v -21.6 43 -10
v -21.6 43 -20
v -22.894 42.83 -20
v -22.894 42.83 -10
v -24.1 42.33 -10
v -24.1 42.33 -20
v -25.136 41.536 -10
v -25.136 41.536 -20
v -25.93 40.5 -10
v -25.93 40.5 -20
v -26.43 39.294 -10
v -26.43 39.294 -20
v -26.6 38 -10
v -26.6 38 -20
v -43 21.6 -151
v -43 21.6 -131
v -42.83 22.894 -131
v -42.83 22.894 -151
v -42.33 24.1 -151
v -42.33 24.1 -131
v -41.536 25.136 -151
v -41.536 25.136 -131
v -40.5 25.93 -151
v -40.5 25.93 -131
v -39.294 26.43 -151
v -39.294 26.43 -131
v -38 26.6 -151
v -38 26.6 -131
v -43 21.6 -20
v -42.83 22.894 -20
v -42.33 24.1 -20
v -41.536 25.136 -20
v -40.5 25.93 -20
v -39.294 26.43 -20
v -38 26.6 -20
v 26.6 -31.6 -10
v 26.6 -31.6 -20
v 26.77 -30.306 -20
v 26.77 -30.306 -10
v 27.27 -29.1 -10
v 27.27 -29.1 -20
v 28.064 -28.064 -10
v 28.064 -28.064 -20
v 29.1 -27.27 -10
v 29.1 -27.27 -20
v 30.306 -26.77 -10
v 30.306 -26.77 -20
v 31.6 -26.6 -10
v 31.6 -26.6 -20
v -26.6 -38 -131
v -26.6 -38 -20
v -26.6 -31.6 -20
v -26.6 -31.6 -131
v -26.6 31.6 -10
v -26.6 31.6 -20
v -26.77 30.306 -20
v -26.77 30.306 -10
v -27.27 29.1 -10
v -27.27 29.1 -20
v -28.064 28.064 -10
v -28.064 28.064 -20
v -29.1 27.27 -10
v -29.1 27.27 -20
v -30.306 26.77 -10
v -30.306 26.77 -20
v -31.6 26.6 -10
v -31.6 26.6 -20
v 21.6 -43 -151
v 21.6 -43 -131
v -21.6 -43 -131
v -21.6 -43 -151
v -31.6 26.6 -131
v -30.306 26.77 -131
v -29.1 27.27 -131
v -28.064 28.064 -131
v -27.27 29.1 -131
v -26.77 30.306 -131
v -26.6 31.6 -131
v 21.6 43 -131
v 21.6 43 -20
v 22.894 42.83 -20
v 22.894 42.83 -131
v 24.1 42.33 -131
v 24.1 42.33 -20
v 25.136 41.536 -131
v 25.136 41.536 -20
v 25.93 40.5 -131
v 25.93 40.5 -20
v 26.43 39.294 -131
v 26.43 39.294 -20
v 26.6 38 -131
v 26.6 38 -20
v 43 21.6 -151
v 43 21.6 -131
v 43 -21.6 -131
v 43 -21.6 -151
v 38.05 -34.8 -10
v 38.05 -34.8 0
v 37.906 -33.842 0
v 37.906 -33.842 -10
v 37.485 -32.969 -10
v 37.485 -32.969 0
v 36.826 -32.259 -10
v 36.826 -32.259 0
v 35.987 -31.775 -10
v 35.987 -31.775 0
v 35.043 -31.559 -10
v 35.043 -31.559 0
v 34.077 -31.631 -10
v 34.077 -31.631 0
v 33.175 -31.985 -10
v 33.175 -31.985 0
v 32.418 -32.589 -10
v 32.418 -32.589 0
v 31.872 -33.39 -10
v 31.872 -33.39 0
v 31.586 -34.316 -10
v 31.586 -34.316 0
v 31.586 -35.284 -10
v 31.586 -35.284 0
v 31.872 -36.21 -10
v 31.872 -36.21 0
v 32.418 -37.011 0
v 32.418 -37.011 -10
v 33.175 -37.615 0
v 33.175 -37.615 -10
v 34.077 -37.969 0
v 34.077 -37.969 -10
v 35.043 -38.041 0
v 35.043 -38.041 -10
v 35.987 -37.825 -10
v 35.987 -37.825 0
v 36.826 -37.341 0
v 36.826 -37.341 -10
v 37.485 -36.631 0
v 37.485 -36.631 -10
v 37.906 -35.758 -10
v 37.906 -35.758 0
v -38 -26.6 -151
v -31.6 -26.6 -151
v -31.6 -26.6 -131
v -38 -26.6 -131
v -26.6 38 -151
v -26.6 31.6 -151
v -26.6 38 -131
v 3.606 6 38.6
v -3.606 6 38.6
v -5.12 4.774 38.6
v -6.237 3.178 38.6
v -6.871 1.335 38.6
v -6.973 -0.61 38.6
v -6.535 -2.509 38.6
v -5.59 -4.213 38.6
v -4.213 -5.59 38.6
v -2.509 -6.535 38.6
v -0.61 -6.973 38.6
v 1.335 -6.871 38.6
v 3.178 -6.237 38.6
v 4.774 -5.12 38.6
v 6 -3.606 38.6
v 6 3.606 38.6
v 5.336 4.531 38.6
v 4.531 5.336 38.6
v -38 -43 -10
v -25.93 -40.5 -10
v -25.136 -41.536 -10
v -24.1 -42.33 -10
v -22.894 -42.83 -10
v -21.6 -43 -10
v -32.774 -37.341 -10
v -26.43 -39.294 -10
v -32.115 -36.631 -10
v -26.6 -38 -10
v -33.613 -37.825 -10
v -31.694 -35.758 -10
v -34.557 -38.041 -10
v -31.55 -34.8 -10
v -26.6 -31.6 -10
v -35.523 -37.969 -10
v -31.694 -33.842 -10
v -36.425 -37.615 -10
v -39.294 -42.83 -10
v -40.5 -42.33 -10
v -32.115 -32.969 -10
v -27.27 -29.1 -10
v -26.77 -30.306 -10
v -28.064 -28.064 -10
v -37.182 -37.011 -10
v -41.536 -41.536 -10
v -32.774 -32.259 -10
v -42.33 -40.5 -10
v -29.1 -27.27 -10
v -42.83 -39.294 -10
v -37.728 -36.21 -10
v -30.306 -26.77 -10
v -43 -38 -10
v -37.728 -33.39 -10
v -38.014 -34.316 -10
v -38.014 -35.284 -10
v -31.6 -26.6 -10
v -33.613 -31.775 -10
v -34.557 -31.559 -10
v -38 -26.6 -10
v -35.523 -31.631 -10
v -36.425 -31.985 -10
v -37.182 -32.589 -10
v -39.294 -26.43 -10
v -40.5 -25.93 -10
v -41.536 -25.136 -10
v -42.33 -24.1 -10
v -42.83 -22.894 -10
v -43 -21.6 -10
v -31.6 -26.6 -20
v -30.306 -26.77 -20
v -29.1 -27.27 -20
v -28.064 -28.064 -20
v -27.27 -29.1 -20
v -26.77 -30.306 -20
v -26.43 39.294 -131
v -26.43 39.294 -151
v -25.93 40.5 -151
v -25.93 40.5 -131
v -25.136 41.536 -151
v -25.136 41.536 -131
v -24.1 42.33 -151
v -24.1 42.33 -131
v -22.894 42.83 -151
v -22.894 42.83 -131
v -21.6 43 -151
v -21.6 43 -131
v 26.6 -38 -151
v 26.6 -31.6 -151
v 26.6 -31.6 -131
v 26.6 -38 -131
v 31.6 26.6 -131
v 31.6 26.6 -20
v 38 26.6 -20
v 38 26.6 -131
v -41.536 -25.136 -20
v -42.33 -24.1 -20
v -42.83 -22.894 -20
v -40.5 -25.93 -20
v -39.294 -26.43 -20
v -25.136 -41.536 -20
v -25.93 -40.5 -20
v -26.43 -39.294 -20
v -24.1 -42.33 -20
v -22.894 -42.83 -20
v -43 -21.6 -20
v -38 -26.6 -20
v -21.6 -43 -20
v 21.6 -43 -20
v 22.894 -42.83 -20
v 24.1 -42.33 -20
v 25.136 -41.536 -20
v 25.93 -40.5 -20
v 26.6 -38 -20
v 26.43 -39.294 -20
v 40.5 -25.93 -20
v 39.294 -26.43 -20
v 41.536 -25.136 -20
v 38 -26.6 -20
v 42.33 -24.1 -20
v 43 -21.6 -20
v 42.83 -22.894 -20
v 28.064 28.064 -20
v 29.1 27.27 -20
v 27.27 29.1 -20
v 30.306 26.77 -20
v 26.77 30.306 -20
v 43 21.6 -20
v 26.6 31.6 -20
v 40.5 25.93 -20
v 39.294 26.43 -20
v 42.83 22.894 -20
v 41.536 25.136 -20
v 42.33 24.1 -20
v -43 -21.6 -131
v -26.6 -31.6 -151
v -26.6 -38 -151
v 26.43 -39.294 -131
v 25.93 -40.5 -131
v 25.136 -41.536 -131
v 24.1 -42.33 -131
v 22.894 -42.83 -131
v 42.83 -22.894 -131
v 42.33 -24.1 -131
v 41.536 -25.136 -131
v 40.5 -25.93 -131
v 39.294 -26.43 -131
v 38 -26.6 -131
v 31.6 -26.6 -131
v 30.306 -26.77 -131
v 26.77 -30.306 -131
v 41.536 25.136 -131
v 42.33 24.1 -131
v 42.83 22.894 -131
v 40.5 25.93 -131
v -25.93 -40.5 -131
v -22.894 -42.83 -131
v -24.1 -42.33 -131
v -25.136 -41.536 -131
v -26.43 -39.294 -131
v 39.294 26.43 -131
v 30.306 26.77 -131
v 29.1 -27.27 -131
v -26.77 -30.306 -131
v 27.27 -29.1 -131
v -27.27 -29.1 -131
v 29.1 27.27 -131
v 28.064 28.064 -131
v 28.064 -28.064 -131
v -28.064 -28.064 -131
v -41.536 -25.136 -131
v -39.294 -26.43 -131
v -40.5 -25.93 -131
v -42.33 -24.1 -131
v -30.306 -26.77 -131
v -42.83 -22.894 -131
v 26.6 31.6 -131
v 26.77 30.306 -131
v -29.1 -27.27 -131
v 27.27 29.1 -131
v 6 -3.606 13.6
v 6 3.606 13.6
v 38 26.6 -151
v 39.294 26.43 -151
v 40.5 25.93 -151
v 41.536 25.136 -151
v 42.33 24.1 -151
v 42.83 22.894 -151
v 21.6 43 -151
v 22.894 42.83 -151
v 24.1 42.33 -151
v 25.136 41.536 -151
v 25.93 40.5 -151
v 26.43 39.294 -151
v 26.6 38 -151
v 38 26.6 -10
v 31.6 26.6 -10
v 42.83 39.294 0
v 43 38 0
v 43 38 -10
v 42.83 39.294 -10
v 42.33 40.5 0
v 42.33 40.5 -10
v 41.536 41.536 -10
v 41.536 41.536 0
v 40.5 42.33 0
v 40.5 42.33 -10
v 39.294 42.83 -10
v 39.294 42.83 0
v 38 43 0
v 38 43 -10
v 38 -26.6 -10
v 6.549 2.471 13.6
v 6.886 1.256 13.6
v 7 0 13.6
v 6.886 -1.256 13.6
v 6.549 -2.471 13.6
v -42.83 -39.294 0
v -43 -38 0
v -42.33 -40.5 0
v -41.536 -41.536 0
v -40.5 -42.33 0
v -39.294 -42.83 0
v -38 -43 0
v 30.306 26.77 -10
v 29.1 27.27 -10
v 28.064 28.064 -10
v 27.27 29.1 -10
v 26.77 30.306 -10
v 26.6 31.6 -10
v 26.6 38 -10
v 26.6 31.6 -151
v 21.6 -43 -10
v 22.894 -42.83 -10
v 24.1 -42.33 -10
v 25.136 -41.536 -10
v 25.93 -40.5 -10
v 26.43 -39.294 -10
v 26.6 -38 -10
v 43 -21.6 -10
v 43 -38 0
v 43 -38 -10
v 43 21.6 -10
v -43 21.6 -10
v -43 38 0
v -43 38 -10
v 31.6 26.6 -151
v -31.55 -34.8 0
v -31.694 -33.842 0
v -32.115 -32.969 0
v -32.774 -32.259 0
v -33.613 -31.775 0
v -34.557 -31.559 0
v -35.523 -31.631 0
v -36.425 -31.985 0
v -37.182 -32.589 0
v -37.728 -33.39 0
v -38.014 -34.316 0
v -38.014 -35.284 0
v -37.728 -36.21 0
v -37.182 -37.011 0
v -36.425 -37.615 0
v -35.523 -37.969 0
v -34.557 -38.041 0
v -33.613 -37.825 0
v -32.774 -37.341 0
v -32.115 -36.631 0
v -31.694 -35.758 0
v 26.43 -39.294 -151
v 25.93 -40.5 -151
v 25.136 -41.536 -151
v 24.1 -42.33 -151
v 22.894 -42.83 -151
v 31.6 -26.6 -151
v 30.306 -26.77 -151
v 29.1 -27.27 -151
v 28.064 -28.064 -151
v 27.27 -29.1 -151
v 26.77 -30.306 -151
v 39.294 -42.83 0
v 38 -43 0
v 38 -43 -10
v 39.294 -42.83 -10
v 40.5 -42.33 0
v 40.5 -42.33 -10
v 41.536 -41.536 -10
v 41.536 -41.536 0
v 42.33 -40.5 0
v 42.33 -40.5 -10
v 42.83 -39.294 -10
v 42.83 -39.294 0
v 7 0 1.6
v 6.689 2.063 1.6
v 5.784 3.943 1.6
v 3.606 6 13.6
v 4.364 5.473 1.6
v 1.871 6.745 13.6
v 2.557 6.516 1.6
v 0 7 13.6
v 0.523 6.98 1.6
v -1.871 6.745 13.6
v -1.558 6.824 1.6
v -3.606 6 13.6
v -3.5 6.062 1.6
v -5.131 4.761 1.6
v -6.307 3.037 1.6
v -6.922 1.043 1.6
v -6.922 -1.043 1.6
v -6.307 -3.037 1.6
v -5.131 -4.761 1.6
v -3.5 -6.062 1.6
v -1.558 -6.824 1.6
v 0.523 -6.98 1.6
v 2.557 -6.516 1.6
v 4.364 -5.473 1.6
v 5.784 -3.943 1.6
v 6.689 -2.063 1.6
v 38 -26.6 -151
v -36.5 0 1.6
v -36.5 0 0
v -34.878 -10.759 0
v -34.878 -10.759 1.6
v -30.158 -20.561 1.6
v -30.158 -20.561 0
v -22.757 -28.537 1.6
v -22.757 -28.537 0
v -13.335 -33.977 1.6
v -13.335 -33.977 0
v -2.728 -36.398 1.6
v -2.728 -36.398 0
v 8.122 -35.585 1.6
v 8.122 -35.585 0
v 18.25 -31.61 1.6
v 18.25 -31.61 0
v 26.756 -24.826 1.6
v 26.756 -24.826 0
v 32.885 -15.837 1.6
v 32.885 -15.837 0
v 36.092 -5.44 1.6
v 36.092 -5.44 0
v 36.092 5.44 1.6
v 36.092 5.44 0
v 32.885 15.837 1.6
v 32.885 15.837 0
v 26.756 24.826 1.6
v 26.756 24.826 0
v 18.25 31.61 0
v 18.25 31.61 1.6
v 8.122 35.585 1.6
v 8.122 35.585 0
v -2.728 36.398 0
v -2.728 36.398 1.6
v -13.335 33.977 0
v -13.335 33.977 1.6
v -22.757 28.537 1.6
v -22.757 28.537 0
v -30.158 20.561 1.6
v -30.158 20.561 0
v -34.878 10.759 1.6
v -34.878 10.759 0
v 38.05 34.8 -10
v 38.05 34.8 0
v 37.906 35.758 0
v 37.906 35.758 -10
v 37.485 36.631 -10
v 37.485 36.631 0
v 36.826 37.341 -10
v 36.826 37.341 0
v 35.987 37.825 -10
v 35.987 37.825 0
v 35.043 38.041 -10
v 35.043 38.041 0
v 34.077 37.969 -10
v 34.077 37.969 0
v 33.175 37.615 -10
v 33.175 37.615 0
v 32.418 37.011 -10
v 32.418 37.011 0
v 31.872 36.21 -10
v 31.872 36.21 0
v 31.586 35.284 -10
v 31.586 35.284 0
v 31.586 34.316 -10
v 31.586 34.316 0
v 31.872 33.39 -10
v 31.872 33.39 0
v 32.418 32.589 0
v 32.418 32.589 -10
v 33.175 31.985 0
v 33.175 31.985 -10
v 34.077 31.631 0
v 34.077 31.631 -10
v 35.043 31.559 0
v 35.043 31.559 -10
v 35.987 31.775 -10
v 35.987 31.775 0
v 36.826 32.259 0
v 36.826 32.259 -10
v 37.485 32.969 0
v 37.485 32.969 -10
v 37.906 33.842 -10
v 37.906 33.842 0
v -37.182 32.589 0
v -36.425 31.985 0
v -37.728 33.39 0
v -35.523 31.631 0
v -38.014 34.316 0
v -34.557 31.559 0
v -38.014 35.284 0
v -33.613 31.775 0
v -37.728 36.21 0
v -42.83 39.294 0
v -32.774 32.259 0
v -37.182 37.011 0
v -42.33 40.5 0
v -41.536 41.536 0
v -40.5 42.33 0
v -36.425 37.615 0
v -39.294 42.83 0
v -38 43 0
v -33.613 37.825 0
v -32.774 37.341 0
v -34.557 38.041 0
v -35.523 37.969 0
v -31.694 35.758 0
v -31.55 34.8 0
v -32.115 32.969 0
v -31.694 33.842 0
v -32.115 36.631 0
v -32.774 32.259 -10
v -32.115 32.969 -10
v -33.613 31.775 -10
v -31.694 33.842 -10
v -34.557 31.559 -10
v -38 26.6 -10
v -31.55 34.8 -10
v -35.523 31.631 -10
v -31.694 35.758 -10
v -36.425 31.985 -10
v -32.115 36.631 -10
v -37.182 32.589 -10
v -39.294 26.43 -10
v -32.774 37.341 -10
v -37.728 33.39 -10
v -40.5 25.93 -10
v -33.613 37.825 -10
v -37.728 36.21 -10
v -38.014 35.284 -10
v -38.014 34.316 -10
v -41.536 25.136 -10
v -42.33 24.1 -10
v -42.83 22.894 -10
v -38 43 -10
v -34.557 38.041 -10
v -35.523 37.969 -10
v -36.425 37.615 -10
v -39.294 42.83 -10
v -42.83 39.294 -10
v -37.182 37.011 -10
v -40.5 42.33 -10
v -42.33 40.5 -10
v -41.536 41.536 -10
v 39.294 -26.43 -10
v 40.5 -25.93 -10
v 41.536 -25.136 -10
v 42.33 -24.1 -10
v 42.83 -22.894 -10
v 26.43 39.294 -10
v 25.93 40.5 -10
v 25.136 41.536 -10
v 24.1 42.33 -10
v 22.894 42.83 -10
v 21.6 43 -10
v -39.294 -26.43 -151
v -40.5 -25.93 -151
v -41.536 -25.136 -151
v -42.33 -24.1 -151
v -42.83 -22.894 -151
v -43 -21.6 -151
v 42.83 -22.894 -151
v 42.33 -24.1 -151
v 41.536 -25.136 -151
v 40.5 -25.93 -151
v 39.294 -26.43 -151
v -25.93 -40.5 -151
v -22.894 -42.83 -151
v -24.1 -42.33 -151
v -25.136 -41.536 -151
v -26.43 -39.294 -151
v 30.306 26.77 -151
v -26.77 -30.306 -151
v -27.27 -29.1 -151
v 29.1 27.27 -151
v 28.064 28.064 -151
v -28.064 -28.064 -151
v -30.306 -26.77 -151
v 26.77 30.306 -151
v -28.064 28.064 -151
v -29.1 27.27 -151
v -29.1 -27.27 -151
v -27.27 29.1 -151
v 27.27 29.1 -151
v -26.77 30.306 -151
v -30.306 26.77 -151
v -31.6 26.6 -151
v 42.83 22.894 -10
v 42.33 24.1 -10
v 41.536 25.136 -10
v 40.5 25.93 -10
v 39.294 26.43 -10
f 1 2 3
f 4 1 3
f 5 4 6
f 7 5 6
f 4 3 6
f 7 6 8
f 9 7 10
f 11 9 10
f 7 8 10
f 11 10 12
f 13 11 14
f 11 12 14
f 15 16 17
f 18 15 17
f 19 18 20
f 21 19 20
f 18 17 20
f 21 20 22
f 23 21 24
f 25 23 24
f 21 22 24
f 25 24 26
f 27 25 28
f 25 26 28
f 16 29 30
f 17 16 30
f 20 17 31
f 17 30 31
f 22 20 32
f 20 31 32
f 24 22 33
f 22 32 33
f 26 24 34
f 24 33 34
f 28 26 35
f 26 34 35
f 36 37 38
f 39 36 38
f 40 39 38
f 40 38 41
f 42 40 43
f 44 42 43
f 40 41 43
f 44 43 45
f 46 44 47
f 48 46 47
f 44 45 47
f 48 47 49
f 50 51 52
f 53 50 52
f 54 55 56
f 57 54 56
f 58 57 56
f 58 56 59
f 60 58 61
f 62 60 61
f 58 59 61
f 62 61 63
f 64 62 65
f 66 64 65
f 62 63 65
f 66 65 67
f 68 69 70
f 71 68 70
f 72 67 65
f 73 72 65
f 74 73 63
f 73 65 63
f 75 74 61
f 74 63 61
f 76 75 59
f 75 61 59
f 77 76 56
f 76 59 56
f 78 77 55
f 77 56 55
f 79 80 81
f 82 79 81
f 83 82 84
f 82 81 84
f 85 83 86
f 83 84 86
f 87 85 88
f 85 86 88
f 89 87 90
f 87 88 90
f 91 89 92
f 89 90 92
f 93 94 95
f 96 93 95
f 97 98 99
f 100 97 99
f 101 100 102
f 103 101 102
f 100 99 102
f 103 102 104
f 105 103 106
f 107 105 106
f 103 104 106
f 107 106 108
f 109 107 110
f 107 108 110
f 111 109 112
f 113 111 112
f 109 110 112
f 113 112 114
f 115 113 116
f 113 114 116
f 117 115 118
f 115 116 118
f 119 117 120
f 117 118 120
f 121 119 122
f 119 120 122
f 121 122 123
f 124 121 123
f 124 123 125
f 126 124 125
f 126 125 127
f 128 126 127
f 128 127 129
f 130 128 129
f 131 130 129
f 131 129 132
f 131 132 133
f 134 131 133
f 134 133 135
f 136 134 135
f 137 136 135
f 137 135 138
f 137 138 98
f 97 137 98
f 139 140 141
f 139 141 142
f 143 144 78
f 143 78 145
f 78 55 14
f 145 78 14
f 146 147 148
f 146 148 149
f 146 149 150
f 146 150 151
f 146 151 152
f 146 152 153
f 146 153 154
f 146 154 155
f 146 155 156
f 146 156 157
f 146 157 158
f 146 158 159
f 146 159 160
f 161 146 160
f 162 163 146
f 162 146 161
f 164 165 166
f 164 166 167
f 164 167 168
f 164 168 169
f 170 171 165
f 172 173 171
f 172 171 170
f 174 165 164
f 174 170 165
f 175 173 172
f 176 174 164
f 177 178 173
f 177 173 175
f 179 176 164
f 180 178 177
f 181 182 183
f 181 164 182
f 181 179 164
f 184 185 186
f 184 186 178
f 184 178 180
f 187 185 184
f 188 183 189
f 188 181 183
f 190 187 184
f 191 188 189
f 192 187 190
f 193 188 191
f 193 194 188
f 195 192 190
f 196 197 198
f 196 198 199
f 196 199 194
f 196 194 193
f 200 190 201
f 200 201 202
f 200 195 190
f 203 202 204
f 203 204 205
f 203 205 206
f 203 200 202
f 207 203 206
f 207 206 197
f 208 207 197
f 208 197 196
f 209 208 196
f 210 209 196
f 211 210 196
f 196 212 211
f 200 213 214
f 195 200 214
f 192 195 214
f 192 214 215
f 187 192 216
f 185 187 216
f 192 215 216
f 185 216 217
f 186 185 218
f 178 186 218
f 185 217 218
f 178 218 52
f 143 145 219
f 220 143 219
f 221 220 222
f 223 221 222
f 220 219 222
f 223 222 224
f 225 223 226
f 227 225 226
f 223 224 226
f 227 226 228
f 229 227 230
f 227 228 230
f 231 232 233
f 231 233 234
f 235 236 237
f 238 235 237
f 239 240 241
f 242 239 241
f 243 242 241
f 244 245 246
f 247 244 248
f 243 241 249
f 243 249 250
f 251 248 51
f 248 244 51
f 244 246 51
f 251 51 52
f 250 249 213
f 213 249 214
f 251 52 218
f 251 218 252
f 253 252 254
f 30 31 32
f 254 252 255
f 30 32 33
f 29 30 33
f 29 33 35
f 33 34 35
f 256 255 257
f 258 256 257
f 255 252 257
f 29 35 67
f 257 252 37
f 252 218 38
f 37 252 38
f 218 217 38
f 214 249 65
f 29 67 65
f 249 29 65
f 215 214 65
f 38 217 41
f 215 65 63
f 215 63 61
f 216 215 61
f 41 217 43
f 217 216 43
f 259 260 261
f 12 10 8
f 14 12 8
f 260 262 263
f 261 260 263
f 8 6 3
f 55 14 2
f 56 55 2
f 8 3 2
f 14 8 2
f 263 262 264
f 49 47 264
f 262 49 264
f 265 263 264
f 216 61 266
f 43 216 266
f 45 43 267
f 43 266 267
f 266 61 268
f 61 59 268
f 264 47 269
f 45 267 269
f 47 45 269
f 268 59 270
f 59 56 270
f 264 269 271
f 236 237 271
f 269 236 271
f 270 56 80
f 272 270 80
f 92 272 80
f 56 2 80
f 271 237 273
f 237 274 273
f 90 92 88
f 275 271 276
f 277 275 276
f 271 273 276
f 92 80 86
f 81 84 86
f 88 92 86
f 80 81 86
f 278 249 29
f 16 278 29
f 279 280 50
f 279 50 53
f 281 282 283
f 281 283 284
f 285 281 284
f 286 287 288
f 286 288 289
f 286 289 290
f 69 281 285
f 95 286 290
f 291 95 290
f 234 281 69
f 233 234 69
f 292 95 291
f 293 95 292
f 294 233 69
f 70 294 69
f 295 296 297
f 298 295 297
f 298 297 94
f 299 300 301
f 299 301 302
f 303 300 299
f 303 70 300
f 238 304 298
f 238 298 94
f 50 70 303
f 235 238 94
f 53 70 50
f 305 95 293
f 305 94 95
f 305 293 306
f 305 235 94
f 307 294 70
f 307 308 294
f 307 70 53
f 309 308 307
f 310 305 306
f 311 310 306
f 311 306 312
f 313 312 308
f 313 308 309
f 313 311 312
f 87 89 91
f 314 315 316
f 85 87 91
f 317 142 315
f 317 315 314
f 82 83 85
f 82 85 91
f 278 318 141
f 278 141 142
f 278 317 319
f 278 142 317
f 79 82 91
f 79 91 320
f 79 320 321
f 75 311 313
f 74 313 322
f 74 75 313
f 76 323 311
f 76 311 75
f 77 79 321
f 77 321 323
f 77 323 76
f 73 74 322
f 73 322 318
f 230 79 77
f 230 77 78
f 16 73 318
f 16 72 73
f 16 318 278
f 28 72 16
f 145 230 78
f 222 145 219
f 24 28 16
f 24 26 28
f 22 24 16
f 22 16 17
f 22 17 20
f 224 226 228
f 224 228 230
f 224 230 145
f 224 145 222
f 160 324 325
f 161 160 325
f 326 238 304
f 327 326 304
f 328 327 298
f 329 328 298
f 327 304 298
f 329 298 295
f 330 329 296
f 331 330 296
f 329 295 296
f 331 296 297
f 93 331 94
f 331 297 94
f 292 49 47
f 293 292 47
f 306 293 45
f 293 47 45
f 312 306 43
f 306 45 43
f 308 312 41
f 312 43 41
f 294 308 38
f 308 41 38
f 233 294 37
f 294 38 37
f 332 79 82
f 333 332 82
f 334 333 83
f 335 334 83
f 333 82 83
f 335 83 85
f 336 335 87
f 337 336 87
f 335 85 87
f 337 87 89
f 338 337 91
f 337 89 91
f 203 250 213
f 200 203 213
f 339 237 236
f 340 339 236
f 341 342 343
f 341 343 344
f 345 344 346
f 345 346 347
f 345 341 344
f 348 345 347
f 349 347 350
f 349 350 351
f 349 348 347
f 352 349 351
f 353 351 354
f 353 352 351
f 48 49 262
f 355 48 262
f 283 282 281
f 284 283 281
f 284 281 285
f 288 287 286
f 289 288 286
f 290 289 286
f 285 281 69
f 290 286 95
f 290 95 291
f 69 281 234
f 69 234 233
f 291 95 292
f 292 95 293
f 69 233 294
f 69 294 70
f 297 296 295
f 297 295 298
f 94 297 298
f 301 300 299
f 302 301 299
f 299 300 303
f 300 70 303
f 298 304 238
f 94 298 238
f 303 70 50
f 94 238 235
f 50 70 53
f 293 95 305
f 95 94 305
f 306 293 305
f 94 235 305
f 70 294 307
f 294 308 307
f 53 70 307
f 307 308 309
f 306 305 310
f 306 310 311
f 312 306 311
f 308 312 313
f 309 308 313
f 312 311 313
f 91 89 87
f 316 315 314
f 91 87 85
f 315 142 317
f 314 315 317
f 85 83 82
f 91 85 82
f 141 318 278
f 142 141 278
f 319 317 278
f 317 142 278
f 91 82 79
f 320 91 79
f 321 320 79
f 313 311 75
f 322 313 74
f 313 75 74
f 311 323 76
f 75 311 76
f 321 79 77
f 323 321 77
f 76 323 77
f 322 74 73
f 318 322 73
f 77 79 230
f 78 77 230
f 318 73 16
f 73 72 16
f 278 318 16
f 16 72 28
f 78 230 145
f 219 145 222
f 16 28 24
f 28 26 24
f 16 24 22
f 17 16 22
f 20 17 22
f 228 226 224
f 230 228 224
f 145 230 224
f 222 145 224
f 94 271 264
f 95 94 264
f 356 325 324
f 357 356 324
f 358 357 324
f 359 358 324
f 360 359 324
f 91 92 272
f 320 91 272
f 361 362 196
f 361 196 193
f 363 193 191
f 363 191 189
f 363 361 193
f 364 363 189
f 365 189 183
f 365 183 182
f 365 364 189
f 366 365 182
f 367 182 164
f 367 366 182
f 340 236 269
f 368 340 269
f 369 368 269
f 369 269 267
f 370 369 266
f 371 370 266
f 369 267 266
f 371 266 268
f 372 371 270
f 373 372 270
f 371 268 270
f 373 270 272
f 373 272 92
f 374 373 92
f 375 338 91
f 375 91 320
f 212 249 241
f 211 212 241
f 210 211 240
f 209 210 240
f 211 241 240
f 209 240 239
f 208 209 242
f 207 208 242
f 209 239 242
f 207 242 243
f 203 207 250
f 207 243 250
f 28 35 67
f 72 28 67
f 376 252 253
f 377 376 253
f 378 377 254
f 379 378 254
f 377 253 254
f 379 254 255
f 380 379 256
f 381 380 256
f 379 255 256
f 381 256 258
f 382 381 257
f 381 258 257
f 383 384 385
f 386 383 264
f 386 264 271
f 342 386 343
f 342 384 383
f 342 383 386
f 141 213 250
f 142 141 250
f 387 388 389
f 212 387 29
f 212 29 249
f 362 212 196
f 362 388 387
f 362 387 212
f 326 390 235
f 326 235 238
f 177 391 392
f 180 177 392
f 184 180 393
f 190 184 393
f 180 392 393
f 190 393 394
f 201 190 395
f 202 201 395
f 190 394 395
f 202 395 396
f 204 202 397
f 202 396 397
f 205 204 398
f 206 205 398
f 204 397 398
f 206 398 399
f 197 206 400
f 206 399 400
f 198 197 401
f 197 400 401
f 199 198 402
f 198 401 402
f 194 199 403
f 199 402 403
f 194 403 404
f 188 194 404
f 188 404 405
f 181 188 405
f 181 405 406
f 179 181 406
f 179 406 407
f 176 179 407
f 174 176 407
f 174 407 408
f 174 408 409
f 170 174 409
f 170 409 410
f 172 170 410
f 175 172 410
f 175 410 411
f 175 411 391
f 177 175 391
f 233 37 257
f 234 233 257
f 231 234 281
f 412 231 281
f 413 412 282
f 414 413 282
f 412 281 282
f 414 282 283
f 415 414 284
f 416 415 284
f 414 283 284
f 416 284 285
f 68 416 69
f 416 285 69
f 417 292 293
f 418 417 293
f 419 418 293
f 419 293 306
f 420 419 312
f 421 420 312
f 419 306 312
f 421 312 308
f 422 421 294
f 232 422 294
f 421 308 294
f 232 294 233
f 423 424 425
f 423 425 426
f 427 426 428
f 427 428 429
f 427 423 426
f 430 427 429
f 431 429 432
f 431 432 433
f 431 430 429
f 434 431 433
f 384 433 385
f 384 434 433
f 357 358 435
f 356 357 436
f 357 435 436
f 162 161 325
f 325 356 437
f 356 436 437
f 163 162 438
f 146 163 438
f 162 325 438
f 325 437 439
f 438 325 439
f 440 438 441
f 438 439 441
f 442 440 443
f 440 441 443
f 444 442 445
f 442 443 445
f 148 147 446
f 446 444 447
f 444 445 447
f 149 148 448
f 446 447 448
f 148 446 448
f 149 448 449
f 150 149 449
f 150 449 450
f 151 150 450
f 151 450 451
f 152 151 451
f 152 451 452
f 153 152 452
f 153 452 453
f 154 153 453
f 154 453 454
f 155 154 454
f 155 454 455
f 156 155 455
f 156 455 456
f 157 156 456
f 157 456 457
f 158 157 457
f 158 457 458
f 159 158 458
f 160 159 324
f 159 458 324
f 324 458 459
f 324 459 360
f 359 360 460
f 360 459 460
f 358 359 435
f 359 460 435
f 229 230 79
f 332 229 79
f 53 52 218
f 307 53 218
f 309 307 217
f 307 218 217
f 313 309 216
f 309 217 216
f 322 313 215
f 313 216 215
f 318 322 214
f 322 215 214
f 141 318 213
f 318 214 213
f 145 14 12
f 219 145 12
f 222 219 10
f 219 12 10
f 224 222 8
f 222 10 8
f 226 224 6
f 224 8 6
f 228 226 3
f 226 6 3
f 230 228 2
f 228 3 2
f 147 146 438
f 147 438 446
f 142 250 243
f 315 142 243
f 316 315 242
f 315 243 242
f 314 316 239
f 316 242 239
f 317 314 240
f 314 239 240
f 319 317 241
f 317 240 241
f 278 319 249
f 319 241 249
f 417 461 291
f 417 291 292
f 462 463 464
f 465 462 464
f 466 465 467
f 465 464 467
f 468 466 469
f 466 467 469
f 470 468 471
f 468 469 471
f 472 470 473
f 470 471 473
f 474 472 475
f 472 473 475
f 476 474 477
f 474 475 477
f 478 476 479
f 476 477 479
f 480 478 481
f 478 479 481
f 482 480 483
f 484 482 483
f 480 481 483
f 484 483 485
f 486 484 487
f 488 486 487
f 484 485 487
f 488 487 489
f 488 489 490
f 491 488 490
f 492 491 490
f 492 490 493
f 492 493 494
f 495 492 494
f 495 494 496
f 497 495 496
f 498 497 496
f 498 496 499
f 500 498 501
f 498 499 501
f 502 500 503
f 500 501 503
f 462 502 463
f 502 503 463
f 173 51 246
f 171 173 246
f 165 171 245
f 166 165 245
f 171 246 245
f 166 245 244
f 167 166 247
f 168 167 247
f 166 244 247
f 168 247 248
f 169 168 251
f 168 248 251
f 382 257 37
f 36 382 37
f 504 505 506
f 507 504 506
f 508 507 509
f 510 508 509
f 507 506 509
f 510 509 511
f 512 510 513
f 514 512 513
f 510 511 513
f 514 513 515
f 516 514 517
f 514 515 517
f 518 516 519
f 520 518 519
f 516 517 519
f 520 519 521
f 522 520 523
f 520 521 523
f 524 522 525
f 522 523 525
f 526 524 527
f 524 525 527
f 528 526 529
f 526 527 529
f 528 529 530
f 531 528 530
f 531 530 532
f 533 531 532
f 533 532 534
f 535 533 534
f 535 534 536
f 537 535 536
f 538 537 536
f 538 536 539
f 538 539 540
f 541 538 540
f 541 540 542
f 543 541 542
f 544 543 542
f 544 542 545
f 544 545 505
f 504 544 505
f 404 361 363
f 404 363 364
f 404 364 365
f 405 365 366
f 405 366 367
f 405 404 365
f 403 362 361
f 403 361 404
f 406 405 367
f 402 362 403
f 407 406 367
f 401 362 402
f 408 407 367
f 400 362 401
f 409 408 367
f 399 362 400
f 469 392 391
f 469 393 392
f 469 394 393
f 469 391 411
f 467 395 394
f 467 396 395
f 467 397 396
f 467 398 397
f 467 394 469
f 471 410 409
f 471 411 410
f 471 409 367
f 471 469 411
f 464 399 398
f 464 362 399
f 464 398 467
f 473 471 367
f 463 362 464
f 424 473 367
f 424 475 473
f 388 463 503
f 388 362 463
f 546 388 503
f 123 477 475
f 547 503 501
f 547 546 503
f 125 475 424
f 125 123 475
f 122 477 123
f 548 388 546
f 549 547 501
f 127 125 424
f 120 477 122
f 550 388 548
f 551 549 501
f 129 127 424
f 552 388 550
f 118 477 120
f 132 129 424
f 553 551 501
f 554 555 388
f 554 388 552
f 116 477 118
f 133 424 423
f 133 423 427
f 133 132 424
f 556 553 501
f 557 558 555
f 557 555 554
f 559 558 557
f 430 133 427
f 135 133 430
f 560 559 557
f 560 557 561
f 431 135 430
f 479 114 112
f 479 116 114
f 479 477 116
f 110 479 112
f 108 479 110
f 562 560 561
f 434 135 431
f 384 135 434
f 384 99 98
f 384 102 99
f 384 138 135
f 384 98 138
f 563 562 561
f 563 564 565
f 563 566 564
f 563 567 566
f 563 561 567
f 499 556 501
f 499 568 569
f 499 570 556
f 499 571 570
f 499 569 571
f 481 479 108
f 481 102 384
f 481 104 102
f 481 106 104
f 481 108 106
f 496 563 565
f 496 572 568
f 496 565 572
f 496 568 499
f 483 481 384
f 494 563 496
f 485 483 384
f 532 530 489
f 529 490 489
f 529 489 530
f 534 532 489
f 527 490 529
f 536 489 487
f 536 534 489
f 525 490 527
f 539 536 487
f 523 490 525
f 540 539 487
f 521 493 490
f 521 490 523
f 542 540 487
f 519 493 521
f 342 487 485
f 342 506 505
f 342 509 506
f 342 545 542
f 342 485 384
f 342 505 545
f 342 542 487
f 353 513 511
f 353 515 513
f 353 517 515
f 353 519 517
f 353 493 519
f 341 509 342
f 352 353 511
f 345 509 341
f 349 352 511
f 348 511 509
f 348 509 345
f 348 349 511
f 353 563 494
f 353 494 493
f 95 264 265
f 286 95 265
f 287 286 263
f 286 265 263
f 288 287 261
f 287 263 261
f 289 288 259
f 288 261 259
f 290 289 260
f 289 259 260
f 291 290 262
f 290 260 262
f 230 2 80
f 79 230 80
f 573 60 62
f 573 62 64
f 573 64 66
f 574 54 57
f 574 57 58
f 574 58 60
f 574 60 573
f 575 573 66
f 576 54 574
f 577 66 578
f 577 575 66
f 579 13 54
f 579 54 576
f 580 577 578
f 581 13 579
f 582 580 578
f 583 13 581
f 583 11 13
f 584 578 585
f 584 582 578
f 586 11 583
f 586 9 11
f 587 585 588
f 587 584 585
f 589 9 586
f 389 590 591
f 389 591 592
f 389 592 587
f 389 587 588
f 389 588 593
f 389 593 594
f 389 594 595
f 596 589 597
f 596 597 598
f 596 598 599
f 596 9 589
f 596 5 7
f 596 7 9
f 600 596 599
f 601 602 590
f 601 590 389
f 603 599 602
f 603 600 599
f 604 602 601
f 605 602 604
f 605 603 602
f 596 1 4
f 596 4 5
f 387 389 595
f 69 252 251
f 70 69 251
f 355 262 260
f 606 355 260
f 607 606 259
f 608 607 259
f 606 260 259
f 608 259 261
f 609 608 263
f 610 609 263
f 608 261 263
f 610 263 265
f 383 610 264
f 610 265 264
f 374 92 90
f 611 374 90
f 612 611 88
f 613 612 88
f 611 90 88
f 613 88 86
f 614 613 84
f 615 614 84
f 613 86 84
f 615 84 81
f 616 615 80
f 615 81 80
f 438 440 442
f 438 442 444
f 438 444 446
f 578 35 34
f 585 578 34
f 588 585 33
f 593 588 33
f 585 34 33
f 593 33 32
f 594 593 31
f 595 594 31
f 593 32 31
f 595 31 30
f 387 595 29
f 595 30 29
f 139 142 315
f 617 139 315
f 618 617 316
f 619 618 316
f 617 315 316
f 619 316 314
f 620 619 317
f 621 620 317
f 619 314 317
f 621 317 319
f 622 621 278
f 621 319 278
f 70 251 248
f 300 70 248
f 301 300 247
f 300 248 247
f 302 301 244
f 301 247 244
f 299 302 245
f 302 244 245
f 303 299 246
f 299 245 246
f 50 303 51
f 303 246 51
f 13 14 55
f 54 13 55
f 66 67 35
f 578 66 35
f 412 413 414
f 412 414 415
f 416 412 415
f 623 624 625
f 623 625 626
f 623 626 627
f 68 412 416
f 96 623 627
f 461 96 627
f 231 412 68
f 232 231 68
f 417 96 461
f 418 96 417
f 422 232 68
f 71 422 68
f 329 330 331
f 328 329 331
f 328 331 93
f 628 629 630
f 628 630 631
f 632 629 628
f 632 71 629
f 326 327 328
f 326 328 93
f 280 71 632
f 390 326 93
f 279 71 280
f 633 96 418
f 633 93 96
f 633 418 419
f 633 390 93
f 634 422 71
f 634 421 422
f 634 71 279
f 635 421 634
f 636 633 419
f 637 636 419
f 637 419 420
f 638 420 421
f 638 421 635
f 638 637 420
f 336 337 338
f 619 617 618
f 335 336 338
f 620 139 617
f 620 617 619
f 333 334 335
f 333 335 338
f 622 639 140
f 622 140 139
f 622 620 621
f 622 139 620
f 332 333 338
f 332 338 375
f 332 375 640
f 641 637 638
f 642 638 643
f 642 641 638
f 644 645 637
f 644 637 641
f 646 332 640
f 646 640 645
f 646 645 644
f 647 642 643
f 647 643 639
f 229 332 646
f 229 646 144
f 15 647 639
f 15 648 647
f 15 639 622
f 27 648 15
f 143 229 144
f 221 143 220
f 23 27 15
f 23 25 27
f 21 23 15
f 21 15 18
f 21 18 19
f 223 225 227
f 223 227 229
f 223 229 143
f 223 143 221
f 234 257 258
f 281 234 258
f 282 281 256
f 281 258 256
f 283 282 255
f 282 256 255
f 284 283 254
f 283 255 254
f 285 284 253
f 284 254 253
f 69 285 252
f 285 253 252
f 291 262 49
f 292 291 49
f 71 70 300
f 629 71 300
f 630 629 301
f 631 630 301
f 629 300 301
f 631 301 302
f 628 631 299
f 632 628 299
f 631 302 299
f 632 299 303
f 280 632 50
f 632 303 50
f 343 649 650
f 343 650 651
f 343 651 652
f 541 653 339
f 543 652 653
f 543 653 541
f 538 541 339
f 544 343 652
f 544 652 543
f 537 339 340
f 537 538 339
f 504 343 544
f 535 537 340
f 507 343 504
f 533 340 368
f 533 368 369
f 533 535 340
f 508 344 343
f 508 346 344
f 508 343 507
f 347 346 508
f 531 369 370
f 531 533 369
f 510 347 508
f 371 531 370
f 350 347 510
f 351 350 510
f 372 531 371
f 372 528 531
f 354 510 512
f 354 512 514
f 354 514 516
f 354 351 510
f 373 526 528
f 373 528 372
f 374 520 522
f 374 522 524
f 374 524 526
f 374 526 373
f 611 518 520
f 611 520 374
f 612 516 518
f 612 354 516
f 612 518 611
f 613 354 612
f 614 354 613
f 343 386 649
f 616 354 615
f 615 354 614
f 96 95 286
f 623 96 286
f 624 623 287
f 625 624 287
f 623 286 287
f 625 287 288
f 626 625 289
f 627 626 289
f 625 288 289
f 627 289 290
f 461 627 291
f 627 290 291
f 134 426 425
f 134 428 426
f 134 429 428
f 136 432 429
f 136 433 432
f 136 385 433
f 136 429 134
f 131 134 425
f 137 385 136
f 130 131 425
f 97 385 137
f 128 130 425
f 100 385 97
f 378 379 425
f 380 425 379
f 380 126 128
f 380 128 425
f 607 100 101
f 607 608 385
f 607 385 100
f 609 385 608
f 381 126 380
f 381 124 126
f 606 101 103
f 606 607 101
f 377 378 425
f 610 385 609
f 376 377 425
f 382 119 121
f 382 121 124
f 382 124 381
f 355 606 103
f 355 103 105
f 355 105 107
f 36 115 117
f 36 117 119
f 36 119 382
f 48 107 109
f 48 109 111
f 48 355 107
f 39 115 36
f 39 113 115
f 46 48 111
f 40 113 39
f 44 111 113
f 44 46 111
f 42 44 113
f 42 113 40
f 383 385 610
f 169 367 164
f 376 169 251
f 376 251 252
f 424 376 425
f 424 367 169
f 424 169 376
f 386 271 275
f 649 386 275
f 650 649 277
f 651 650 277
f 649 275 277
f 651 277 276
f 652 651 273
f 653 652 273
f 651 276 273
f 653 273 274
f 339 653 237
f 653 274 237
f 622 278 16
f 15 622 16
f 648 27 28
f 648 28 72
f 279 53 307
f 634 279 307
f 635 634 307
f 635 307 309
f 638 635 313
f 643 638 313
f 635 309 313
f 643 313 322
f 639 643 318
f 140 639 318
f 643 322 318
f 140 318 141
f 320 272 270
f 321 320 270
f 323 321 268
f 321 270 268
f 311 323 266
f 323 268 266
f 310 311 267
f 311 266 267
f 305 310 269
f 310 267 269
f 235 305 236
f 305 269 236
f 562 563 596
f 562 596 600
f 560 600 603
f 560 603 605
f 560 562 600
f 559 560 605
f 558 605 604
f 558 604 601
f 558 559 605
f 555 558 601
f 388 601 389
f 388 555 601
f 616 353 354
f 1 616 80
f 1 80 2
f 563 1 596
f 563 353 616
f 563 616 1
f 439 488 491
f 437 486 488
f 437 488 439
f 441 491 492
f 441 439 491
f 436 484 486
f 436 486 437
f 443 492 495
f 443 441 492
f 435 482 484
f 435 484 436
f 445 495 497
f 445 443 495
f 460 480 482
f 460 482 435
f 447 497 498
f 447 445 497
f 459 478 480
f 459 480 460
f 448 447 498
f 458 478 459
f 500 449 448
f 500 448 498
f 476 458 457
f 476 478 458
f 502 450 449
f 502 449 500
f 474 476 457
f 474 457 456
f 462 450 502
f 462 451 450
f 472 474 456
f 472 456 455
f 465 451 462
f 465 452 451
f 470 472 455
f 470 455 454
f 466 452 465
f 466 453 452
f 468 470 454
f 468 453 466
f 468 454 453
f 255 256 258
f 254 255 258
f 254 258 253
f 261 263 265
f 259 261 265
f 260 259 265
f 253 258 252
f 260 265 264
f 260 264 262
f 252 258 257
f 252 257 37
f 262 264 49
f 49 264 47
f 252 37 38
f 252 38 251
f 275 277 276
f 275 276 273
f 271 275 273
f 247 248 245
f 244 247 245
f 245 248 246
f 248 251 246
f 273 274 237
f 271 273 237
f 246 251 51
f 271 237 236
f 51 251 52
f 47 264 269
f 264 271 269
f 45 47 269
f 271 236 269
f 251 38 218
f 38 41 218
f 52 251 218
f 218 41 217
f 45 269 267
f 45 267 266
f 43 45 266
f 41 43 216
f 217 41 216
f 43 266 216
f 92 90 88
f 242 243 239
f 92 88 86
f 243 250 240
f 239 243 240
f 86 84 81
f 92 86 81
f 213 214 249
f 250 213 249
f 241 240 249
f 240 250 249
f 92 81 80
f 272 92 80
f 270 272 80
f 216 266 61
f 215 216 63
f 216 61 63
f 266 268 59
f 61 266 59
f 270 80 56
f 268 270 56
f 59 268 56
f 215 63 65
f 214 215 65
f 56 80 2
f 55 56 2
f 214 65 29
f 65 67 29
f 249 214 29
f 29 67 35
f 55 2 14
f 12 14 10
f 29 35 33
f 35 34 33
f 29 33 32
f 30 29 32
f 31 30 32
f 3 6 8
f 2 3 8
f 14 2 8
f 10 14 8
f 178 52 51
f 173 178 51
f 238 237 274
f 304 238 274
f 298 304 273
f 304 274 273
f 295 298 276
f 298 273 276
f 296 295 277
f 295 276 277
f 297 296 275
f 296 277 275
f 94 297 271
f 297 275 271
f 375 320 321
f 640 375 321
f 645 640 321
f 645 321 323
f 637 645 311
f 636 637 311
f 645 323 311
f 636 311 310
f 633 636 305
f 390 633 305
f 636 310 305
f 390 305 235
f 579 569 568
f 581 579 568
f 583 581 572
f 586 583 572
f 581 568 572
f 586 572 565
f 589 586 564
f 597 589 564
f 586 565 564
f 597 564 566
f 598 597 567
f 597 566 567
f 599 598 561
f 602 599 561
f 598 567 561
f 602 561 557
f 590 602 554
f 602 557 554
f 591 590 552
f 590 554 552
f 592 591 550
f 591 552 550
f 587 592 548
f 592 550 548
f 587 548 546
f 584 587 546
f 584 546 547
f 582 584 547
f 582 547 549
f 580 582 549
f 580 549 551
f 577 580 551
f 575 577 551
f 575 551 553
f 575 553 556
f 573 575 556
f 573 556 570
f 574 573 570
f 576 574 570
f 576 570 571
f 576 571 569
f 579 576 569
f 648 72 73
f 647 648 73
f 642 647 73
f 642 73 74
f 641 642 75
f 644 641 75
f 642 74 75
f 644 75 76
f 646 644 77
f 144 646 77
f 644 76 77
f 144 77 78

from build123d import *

# Parameters (mm, degrees)
SKETCH2_R           = 3.25
BOSS_EXTRUDE1_DEPTH = 20
SKETCH3_R           = 36.5
BOSS_EXTRUDE2_DEPTH = 1.6
SKETCH4_R           = 7
BOSS_EXTRUDE3_DEPTH = 37
CUT_EXTRUDE3_DEPTH  = 25
SKETCH6_OUTSIDE_W   = 115
SKETCH6_OUTSIDE_H   = 115
CUT_EXTRUDE4_DEPTH  = 10
BOSS_EXTRUDE7_DEPTH = 111
BOSS_EXTRUDE8_DEPTH = 20


with BuildPart() as part:
    # Sketch2 → Boss-Extrude1 (new body)
    with BuildSketch(Plane.XY):
        with BuildLine():
            Line((-38, -43), (38, -43))
            ThreePointArc((38, -43), (41.535533906, -41.535533906), (43, -38))
            Line((43, -38), (43, 38))
            ThreePointArc((43, 38), (41.535533906, 41.535533906), (38, 43))
            Line((38, 43), (-38, 43))
            ThreePointArc((-38, 43), (-41.535533906, 41.535533906), (-43, 38))
            Line((-43, 38), (-43, -38))
            ThreePointArc((-43, -38), (-41.535533906, -41.535533906), (-38, -43))
        make_face()
        with Locations((-34.8, 34.8)):
            Circle(SKETCH2_R, mode=Mode.SUBTRACT)
        with Locations((34.8, 34.8)):
            Circle(SKETCH2_R, mode=Mode.SUBTRACT)
        with Locations((34.8, -34.8)):
            Circle(SKETCH2_R, mode=Mode.SUBTRACT)
        with Locations((-34.8, -34.8)):
            Circle(SKETCH2_R, mode=Mode.SUBTRACT)
    extrude(amount=-BOSS_EXTRUDE1_DEPTH)

    # Sketch3 → Boss-Extrude2 (add)
    with BuildSketch(Plane.XY):
        with Locations(Location((0, 0, 0), (0, 0, 180))):
            Circle(SKETCH3_R)
    extrude(amount=BOSS_EXTRUDE2_DEPTH)

    # Sketch4 → Boss-Extrude3 (add)
    with BuildSketch(Plane.XY.offset(1.6)):
        Circle(SKETCH4_R)
    extrude(amount=BOSS_EXTRUDE3_DEPTH)

    # Sketch5 → Cut-Extrude3 (cut)
    with BuildSketch(Plane.XY.offset(38.6)):
        Polygon((-8.822363666, 9.823024255), (12.469733355, 9.823024255), (12.469733355, -15.439136416), (6, -15.439136416), (6, 6), (-8.822363666, 6), align=None)
    extrude(amount=-CUT_EXTRUDE3_DEPTH, mode=Mode.SUBTRACT)

    # Sketch6 outside → Cut-Extrude4 (cut)
    with BuildSketch(Plane(origin=(0, 0, -20), x_dir=(-1, 0, 0), z_dir=(0, 0, -1))):
        Rectangle(SKETCH6_OUTSIDE_W, SKETCH6_OUTSIDE_H)
        with BuildLine():
            Line((-38, 26.6), (-31.6, 26.6))
            ThreePointArc((-31.6, 26.6), (-28.064466094, 28.064466094), (-26.6, 31.6))
            Line((-26.6, 31.6), (-26.6, 38))
            ThreePointArc((-26.6, 38), (-25.135533906, 41.535533906), (-21.6, 43))
            Line((-21.6, 43), (21.6, 43))
            ThreePointArc((21.6, 43), (25.135533906, 41.535533906), (26.6, 38))
            Line((26.6, 38), (26.6, 31.6))
            ThreePointArc((26.6, 31.6), (28.064466094, 28.064466094), (31.6, 26.6))
            Line((31.6, 26.6), (38, 26.6))
            ThreePointArc((38, 26.6), (41.535533906, 25.135533906), (43, 21.6))
            Line((43, 21.6), (43, -21.6))
            ThreePointArc((43, -21.6), (41.535533906, -25.135533906), (38, -26.6))
            Line((38, -26.6), (31.6, -26.6))
            ThreePointArc((31.6, -26.6), (28.064466094, -28.064466094), (26.6, -31.6))
            Line((26.6, -31.6), (26.6, -38))
            ThreePointArc((26.6, -38), (25.135533906, -41.535533906), (21.6, -43))
            Line((21.6, -43), (-21.6, -43))
            ThreePointArc((-21.6, -43), (-25.135533906, -41.535533906), (-26.6, -38))
            Line((-26.6, -38), (-26.6, -31.6))
            ThreePointArc((-26.6, -31.6), (-28.064466094, -28.064466094), (-31.6, -26.6))
            Line((-31.6, -26.6), (-38, -26.6))
            ThreePointArc((-38, -26.6), (-41.535533906, -25.135533906), (-43, -21.6))
            Line((-43, -21.6), (-43, 21.6))
            ThreePointArc((-43, 21.6), (-41.535533906, 25.135533906), (-38, 26.6))
        make_face(mode=Mode.SUBTRACT)
    extrude(amount=-CUT_EXTRUDE4_DEPTH, mode=Mode.SUBTRACT)


with BuildPart() as body_2:
    # Sketch10 → Boss-Extrude7 (new body)
    with BuildSketch(Plane(origin=(0, 0, -20), x_dir=(-1, 0, 0), z_dir=(0, 0, -1))):
        with BuildLine():
            Line((26.6, 31.6), (26.6, 38))
            ThreePointArc((26.6, 38), (25.135533906, 41.535533906), (21.6, 43))
            Line((21.6, 43), (-21.6, 43))
            ThreePointArc((-21.6, 43), (-25.135533906, 41.535533906), (-26.6, 38))
            Line((-26.6, 38), (-26.6, 31.6))
            ThreePointArc((-26.6, 31.6), (-28.064466094, 28.064466094), (-31.6, 26.6))
            Line((-31.6, 26.6), (-38, 26.6))
            ThreePointArc((-38, 26.6), (-41.535533906, 25.135533906), (-43, 21.6))
            Line((-43, 21.6), (-43, -21.6))
            ThreePointArc((-43, -21.6), (-41.535533906, -25.135533906), (-38, -26.6))
            Line((-38, -26.6), (-31.6, -26.6))
            ThreePointArc((-31.6, -26.6), (-28.064466094, -28.064466094), (-26.6, -31.6))
            Line((-26.6, -31.6), (-26.6, -38))
            ThreePointArc((-26.6, -38), (-25.135533906, -41.535533906), (-21.6, -43))
            Line((-21.6, -43), (21.6, -43))
            ThreePointArc((21.6, -43), (25.135533906, -41.535533906), (26.6, -38))
            Line((26.6, -38), (26.6, -31.6))
            ThreePointArc((26.6, -31.6), (28.064466094, -28.064466094), (31.6, -26.6))
            Line((31.6, -26.6), (38, -26.6))
            ThreePointArc((38, -26.6), (41.535533906, -25.135533906), (43, -21.6))
            Line((43, -21.6), (43, 21.6))
            ThreePointArc((43, 21.6), (41.535533906, 25.135533906), (38, 26.6))
            Line((38, 26.6), (31.6, 26.6))
            ThreePointArc((31.6, 26.6), (28.064466094, 28.064466094), (26.6, 31.6))
        make_face()
    extrude(amount=BOSS_EXTRUDE7_DEPTH)


with BuildPart() as body_3:
    # Sketch11 → Boss-Extrude8 (new body)
    with BuildSketch(Plane(origin=(0, 0, -131), x_dir=(-1, 0, 0), z_dir=(0, 0, -1))):
        with BuildLine():
            Line((26.6, 31.6), (26.6, 38))
            ThreePointArc((26.6, 38), (25.135533906, 41.535533906), (21.6, 43))
            Line((21.6, 43), (-21.6, 43))
            ThreePointArc((-21.6, 43), (-25.135533906, 41.535533906), (-26.6, 38))
            Line((-26.6, 38), (-26.6, 31.6))
            ThreePointArc((-26.6, 31.6), (-28.064466094, 28.064466094), (-31.6, 26.6))
            Line((-31.6, 26.6), (-38, 26.6))
            ThreePointArc((-38, 26.6), (-41.535533906, 25.135533906), (-43, 21.6))
            Line((-43, 21.6), (-43, -21.6))
            ThreePointArc((-43, -21.6), (-41.535533906, -25.135533906), (-38, -26.6))
            Line((-38, -26.6), (-31.6, -26.6))
            ThreePointArc((-31.6, -26.6), (-28.064466094, -28.064466094), (-26.6, -31.6))
            Line((-26.6, -31.6), (-26.6, -38))
            ThreePointArc((-26.6, -38), (-25.135533906, -41.535533906), (-21.6, -43))
            Line((-21.6, -43), (21.6, -43))
            ThreePointArc((21.6, -43), (25.135533906, -41.535533906), (26.6, -38))
            Line((26.6, -38), (26.6, -31.6))
            ThreePointArc((26.6, -31.6), (28.064466094, -28.064466094), (31.6, -26.6))
            Line((31.6, -26.6), (38, -26.6))
            ThreePointArc((38, -26.6), (41.535533906, -25.135533906), (43, -21.6))
            Line((43, -21.6), (43, 21.6))
            ThreePointArc((43, 21.6), (41.535533906, 25.135533906), (38, 26.6))
            Line((38, 26.6), (31.6, 26.6))
            ThreePointArc((31.6, 26.6), (28.064466094, 28.064466094), (26.6, 31.6))
        make_face()
    extrude(amount=BOSS_EXTRUDE8_DEPTH)


solid = Compound([part.part, body_2.part, body_3.part])
